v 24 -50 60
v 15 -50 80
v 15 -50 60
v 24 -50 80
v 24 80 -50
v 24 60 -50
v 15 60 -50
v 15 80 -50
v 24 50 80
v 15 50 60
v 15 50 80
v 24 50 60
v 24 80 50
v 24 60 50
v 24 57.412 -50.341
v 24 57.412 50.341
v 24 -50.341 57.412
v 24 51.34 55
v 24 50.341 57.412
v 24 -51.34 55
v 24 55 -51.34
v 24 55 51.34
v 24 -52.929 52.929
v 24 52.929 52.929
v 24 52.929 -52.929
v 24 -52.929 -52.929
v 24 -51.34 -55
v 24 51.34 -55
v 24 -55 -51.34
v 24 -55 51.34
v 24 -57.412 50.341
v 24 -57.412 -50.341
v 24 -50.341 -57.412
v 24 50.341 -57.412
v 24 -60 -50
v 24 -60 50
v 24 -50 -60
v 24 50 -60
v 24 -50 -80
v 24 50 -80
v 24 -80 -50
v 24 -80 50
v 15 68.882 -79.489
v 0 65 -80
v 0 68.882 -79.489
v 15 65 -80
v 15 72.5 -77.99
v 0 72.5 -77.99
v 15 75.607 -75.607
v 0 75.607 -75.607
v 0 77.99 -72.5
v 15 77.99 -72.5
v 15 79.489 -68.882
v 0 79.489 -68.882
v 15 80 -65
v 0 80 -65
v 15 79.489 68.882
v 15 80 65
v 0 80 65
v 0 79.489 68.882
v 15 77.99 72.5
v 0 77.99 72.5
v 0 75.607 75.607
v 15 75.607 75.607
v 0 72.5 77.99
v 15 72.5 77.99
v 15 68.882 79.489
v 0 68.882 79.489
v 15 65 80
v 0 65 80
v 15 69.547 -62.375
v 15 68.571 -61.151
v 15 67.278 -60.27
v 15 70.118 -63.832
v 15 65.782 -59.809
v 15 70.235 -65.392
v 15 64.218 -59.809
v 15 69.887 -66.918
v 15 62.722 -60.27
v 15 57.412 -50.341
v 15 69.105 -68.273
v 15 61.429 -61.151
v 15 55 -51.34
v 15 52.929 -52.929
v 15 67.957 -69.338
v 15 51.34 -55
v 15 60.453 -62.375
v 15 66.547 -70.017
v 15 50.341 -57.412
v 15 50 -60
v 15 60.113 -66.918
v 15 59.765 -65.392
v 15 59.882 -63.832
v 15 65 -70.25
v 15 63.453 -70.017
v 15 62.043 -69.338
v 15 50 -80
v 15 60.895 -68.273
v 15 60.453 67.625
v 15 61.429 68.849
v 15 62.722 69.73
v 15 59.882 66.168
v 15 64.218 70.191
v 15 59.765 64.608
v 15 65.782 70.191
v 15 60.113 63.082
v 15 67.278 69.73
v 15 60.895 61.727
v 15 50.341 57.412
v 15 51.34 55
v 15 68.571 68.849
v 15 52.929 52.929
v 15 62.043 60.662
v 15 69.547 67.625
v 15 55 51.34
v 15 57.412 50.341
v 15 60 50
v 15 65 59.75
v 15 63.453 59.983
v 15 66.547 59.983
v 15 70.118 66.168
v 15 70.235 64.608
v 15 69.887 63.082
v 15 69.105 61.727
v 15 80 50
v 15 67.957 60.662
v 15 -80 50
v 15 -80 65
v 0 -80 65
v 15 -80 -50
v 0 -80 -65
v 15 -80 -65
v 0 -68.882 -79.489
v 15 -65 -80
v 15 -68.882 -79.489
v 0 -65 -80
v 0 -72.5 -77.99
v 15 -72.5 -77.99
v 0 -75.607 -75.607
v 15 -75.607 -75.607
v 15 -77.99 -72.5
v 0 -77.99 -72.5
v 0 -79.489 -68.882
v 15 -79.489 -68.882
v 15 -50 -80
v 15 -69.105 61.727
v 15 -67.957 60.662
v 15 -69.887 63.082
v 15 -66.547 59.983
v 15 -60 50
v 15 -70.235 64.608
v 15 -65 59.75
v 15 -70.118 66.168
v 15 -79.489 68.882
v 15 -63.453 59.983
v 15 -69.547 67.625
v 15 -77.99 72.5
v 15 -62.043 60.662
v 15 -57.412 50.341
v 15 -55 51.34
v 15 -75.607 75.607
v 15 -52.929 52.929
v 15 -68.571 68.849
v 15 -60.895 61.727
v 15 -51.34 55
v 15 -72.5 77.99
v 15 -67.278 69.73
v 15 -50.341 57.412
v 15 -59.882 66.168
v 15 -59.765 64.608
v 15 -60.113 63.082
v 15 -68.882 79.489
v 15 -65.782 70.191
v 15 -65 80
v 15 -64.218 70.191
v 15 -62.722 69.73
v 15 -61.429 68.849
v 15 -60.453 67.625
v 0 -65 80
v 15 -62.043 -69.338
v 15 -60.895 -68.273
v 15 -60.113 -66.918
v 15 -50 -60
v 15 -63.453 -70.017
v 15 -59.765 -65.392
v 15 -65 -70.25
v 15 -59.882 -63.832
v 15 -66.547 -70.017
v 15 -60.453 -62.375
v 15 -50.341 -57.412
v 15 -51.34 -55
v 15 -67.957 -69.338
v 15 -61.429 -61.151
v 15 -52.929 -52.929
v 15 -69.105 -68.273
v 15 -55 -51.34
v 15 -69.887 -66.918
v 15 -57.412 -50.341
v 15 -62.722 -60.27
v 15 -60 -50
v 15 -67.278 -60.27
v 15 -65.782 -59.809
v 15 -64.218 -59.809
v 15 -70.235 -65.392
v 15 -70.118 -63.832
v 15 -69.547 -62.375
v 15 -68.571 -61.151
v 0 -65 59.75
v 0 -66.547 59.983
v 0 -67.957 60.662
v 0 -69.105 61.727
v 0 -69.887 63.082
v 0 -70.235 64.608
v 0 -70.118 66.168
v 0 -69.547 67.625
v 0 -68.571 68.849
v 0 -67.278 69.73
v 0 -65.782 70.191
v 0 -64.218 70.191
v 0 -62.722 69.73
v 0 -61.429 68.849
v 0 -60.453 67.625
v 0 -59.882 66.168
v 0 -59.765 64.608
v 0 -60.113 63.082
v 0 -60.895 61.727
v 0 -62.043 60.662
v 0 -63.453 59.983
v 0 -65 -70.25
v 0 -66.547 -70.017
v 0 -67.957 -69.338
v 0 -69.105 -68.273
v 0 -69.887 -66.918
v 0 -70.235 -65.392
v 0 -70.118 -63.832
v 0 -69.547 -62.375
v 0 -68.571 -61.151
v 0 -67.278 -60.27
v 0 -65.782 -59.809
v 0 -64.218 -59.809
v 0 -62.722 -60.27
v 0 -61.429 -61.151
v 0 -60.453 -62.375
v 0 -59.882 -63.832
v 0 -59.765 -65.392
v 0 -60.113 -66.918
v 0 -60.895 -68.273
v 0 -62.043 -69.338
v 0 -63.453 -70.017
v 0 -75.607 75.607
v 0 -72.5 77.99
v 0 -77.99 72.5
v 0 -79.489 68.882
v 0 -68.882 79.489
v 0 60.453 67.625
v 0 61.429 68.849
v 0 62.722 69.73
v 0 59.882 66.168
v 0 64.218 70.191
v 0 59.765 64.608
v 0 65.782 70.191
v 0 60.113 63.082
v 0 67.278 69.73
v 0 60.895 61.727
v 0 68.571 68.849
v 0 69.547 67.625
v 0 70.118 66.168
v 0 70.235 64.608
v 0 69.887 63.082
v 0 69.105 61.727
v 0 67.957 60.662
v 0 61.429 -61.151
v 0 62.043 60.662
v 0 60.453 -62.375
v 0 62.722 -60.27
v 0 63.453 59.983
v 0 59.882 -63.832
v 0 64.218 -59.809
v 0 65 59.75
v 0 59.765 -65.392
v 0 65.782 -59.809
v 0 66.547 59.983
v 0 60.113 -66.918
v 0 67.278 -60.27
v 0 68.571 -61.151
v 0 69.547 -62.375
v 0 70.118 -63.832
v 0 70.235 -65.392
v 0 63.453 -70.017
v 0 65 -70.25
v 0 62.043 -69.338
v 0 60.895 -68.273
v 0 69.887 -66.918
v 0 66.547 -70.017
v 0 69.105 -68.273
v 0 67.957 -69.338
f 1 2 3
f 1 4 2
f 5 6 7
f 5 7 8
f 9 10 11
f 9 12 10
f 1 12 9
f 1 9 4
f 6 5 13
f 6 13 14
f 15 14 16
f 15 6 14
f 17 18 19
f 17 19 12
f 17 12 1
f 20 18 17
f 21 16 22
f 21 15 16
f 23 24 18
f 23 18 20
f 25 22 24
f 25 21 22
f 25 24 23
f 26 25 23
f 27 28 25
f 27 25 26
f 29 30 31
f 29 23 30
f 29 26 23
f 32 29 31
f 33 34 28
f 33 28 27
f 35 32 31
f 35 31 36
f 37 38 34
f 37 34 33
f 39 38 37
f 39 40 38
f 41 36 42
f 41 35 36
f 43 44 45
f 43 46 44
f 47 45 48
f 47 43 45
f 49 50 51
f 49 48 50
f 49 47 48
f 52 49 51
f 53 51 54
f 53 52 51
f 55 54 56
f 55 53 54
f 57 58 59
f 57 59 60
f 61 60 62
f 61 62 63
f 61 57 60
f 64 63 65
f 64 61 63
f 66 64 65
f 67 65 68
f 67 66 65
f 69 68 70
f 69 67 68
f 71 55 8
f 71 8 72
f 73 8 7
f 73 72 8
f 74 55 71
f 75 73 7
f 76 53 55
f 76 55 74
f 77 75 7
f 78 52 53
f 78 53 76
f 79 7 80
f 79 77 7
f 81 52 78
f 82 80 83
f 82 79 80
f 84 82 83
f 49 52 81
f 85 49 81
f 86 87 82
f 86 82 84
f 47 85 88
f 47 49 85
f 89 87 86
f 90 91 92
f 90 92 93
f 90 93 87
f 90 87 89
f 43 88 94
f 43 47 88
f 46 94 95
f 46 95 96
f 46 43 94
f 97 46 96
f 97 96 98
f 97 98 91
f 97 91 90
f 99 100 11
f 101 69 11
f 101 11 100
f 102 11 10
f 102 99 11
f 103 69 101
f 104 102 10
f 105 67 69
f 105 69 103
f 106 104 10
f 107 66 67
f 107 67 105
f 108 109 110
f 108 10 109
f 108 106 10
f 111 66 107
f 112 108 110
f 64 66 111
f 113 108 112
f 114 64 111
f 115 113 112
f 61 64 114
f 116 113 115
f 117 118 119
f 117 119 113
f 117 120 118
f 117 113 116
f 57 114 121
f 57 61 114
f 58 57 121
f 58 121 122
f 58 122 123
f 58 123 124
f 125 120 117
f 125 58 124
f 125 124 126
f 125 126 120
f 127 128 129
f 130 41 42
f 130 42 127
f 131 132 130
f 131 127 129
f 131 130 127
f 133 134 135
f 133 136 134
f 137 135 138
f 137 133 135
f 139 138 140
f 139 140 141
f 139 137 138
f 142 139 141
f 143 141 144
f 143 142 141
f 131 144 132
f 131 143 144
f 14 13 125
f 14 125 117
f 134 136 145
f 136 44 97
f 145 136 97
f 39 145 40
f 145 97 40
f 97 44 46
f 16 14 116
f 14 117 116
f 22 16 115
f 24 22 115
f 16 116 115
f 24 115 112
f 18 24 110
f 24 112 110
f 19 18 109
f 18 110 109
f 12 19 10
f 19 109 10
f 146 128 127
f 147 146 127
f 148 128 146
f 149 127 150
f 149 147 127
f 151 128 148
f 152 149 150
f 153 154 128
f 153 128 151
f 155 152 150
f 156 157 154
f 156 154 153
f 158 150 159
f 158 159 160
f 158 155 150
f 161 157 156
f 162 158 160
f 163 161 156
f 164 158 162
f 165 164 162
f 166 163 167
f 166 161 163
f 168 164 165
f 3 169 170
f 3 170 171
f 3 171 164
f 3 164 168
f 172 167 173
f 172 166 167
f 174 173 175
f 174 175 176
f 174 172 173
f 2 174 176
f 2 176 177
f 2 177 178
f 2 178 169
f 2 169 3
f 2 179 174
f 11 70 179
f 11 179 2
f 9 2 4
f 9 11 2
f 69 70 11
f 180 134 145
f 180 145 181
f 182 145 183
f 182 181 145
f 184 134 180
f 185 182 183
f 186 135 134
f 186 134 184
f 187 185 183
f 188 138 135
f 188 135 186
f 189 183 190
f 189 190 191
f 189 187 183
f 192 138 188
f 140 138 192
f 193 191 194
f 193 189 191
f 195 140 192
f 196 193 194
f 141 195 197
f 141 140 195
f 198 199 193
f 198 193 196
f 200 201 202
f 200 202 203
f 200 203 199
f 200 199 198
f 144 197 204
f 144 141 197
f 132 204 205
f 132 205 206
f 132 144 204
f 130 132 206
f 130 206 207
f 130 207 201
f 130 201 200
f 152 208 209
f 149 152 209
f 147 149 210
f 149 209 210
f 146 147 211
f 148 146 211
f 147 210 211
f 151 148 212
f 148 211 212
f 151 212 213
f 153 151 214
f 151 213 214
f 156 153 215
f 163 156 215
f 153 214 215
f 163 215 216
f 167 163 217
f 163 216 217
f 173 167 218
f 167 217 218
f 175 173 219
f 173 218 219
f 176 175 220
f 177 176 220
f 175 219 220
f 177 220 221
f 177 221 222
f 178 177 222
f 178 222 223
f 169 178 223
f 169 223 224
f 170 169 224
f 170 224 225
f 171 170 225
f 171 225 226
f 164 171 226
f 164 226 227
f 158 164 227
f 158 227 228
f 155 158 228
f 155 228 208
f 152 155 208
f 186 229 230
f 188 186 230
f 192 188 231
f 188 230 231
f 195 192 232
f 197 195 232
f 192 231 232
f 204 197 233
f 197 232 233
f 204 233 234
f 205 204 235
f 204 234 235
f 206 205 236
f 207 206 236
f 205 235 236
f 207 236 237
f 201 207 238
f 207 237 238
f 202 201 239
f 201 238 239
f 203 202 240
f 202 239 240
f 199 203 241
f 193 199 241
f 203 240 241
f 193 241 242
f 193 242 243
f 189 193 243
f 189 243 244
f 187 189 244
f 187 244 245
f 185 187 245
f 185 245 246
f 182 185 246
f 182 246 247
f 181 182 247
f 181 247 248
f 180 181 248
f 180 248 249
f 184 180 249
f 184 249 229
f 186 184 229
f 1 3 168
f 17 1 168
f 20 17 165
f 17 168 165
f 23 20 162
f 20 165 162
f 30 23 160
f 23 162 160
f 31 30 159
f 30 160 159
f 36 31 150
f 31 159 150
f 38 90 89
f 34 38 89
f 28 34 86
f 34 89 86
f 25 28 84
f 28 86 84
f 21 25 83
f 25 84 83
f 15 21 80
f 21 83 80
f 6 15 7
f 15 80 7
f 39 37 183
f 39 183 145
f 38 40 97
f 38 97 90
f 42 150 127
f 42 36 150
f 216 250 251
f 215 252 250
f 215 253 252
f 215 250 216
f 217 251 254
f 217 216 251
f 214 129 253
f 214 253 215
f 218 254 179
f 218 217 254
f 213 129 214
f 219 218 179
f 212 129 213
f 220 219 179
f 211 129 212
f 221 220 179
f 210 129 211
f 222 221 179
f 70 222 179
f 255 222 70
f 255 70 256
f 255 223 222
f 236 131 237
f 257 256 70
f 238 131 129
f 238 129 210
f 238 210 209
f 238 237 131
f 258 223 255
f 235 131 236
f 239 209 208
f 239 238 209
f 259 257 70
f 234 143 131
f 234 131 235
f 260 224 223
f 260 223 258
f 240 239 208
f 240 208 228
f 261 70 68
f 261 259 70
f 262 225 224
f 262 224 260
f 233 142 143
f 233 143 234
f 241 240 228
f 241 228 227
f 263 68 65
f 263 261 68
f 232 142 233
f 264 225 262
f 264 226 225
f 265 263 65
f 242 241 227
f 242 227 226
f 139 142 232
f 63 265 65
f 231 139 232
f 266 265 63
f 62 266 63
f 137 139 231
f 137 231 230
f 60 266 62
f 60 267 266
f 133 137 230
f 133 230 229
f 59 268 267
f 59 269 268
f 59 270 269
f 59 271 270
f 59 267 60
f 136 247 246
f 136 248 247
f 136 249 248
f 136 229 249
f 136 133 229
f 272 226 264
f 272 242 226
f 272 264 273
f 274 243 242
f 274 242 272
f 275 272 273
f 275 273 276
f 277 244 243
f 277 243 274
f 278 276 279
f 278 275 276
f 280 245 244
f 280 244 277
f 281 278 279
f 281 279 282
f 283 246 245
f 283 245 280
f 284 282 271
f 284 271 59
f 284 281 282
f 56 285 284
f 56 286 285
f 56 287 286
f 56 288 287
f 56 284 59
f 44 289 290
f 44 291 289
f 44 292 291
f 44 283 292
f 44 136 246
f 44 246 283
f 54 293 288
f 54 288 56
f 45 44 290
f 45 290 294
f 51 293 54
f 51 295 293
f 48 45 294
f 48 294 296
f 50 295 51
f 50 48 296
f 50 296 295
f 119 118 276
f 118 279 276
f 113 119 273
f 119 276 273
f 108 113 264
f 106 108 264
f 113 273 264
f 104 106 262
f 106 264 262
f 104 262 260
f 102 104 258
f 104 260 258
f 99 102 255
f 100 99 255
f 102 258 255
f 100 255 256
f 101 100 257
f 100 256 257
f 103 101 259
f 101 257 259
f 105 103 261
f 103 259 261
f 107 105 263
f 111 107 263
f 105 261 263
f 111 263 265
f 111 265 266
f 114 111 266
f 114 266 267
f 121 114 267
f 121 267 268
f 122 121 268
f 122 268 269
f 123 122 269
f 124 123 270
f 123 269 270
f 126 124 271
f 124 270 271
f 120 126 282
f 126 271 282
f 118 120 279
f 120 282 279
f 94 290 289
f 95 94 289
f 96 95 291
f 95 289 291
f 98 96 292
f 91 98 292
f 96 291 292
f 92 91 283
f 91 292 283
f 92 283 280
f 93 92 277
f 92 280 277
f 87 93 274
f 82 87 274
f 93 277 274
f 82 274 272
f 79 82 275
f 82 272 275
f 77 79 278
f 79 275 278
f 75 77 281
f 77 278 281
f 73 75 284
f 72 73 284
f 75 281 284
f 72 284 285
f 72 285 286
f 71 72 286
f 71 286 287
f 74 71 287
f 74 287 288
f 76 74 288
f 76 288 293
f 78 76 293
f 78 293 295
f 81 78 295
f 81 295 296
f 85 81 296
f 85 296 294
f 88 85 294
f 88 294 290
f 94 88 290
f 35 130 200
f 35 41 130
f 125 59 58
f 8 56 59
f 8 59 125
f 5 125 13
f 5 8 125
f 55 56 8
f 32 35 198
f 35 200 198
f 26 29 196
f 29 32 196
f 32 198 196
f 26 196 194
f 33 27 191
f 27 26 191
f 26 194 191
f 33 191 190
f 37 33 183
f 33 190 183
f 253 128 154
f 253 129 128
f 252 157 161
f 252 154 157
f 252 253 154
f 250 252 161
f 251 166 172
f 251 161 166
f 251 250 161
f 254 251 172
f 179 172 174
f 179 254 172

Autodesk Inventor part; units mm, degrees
ref_plane "YZ Plane" through (0, 0, 0) normal (1, 0, 0) x (0, 1, 0)
ref_plane "XZ Plane" through (0, 0, 0) normal (0, 1, 0) x (-1, 0, 0)
ref_plane "XY Plane" through (0, 0, 0) normal (0, 0, 1) x (1, 0, 0)
sketch "Skizze1" plane through (0, 0, 0) normal (0, 0, 1) x (1, 0, 0)
  line L0 (0, 80) -> (24, 80)
  line L1 (24, 80) -> (24, -80)
  line L2 (24, -80) -> (0, -80)
  line L3 (0, -80) -> (0, 80)
  line L4 (24, 40) -> (124, 40)
  line L5 (124, 40) -> (124, -40)
  line L6 (124, -40) -> (24, -40)
  line L7 (24, -40) -> (24, 40)
  point P0 (0, 0)
  point P1 (24, 0)
  point P2 (0, 0)
  point P3 (94, 0)
  point P4 (124, 0)
  dimension "d0" = 160
  dimension "d1" = 24
  dimension "d2" = 124
  dimension "d3" = 80
  dimension "d4" = 94
extrude "Extrusion1" add sketch "Skizze1" along normal mid plane 160 contours L0 L1 L2 L3
sketch "Skizze2" plane through (24, -80, 80) normal (1, 0, 0) x (0, 0, -1)
  line L0 (0, 160) -> (30, 160)
  line L1 (30, 160) -> (30, 130)
  line L2 (30, 130) -> (0, 130)
  line L3 (0, 130) -> (0, 160)
  point P0 (80, 80)
  dimension "d19" = 30
  dimension "d20" = 30
extrude "Extrusion4" cut sketch "Skizze2" against normal blind 9
pattern_circular "Runde Anordnung1" count 4 over 360 about axis through (-10, 0, 0) along (1, 0, 0) of "Extrusion4"
sketch "Skizze3" plane through (24, 50, 50) normal (1, 0, 0) x (0, 0, -1)
  line L0 (-15, 15) -> (115, 15)
  line L1 (115, 15) -> (115, -115)
  line L2 (115, -115) -> (-15, -115)
  line L3 (-15, -115) -> (-15, 15)
  line L4 (-15, 15) -> (115, -115) construction
  line L5 (115, 15) -> (-15, -115) construction
  point P0 (50, -50)
  dimension "d26" = 130
  dimension "d27" = 130
hole "Bohrung2" at (24, 65, 65) at (24, -65, 65) at (24, 65, -65) at (24, -65, -65) direction (-1, 0, 0) diameter 10.5 end through all
fillet "Rundung2" radius 15 4 edges at (7.5, 80, -80) (7.5, -80, -80) (7.5, -80, 80) (7.5, 80, 80)
fillet "Rundung3" radius 10 4 edges at (19.5, -50, 50) (19.5, -50, -50) (19.5, 50, -50) (19.5, 50, 50)
equation "\"d5\" = d0"
properties part number "Gelenkflansch_Hinten_ohne_halterung" material "Stahl AISI 4130"
